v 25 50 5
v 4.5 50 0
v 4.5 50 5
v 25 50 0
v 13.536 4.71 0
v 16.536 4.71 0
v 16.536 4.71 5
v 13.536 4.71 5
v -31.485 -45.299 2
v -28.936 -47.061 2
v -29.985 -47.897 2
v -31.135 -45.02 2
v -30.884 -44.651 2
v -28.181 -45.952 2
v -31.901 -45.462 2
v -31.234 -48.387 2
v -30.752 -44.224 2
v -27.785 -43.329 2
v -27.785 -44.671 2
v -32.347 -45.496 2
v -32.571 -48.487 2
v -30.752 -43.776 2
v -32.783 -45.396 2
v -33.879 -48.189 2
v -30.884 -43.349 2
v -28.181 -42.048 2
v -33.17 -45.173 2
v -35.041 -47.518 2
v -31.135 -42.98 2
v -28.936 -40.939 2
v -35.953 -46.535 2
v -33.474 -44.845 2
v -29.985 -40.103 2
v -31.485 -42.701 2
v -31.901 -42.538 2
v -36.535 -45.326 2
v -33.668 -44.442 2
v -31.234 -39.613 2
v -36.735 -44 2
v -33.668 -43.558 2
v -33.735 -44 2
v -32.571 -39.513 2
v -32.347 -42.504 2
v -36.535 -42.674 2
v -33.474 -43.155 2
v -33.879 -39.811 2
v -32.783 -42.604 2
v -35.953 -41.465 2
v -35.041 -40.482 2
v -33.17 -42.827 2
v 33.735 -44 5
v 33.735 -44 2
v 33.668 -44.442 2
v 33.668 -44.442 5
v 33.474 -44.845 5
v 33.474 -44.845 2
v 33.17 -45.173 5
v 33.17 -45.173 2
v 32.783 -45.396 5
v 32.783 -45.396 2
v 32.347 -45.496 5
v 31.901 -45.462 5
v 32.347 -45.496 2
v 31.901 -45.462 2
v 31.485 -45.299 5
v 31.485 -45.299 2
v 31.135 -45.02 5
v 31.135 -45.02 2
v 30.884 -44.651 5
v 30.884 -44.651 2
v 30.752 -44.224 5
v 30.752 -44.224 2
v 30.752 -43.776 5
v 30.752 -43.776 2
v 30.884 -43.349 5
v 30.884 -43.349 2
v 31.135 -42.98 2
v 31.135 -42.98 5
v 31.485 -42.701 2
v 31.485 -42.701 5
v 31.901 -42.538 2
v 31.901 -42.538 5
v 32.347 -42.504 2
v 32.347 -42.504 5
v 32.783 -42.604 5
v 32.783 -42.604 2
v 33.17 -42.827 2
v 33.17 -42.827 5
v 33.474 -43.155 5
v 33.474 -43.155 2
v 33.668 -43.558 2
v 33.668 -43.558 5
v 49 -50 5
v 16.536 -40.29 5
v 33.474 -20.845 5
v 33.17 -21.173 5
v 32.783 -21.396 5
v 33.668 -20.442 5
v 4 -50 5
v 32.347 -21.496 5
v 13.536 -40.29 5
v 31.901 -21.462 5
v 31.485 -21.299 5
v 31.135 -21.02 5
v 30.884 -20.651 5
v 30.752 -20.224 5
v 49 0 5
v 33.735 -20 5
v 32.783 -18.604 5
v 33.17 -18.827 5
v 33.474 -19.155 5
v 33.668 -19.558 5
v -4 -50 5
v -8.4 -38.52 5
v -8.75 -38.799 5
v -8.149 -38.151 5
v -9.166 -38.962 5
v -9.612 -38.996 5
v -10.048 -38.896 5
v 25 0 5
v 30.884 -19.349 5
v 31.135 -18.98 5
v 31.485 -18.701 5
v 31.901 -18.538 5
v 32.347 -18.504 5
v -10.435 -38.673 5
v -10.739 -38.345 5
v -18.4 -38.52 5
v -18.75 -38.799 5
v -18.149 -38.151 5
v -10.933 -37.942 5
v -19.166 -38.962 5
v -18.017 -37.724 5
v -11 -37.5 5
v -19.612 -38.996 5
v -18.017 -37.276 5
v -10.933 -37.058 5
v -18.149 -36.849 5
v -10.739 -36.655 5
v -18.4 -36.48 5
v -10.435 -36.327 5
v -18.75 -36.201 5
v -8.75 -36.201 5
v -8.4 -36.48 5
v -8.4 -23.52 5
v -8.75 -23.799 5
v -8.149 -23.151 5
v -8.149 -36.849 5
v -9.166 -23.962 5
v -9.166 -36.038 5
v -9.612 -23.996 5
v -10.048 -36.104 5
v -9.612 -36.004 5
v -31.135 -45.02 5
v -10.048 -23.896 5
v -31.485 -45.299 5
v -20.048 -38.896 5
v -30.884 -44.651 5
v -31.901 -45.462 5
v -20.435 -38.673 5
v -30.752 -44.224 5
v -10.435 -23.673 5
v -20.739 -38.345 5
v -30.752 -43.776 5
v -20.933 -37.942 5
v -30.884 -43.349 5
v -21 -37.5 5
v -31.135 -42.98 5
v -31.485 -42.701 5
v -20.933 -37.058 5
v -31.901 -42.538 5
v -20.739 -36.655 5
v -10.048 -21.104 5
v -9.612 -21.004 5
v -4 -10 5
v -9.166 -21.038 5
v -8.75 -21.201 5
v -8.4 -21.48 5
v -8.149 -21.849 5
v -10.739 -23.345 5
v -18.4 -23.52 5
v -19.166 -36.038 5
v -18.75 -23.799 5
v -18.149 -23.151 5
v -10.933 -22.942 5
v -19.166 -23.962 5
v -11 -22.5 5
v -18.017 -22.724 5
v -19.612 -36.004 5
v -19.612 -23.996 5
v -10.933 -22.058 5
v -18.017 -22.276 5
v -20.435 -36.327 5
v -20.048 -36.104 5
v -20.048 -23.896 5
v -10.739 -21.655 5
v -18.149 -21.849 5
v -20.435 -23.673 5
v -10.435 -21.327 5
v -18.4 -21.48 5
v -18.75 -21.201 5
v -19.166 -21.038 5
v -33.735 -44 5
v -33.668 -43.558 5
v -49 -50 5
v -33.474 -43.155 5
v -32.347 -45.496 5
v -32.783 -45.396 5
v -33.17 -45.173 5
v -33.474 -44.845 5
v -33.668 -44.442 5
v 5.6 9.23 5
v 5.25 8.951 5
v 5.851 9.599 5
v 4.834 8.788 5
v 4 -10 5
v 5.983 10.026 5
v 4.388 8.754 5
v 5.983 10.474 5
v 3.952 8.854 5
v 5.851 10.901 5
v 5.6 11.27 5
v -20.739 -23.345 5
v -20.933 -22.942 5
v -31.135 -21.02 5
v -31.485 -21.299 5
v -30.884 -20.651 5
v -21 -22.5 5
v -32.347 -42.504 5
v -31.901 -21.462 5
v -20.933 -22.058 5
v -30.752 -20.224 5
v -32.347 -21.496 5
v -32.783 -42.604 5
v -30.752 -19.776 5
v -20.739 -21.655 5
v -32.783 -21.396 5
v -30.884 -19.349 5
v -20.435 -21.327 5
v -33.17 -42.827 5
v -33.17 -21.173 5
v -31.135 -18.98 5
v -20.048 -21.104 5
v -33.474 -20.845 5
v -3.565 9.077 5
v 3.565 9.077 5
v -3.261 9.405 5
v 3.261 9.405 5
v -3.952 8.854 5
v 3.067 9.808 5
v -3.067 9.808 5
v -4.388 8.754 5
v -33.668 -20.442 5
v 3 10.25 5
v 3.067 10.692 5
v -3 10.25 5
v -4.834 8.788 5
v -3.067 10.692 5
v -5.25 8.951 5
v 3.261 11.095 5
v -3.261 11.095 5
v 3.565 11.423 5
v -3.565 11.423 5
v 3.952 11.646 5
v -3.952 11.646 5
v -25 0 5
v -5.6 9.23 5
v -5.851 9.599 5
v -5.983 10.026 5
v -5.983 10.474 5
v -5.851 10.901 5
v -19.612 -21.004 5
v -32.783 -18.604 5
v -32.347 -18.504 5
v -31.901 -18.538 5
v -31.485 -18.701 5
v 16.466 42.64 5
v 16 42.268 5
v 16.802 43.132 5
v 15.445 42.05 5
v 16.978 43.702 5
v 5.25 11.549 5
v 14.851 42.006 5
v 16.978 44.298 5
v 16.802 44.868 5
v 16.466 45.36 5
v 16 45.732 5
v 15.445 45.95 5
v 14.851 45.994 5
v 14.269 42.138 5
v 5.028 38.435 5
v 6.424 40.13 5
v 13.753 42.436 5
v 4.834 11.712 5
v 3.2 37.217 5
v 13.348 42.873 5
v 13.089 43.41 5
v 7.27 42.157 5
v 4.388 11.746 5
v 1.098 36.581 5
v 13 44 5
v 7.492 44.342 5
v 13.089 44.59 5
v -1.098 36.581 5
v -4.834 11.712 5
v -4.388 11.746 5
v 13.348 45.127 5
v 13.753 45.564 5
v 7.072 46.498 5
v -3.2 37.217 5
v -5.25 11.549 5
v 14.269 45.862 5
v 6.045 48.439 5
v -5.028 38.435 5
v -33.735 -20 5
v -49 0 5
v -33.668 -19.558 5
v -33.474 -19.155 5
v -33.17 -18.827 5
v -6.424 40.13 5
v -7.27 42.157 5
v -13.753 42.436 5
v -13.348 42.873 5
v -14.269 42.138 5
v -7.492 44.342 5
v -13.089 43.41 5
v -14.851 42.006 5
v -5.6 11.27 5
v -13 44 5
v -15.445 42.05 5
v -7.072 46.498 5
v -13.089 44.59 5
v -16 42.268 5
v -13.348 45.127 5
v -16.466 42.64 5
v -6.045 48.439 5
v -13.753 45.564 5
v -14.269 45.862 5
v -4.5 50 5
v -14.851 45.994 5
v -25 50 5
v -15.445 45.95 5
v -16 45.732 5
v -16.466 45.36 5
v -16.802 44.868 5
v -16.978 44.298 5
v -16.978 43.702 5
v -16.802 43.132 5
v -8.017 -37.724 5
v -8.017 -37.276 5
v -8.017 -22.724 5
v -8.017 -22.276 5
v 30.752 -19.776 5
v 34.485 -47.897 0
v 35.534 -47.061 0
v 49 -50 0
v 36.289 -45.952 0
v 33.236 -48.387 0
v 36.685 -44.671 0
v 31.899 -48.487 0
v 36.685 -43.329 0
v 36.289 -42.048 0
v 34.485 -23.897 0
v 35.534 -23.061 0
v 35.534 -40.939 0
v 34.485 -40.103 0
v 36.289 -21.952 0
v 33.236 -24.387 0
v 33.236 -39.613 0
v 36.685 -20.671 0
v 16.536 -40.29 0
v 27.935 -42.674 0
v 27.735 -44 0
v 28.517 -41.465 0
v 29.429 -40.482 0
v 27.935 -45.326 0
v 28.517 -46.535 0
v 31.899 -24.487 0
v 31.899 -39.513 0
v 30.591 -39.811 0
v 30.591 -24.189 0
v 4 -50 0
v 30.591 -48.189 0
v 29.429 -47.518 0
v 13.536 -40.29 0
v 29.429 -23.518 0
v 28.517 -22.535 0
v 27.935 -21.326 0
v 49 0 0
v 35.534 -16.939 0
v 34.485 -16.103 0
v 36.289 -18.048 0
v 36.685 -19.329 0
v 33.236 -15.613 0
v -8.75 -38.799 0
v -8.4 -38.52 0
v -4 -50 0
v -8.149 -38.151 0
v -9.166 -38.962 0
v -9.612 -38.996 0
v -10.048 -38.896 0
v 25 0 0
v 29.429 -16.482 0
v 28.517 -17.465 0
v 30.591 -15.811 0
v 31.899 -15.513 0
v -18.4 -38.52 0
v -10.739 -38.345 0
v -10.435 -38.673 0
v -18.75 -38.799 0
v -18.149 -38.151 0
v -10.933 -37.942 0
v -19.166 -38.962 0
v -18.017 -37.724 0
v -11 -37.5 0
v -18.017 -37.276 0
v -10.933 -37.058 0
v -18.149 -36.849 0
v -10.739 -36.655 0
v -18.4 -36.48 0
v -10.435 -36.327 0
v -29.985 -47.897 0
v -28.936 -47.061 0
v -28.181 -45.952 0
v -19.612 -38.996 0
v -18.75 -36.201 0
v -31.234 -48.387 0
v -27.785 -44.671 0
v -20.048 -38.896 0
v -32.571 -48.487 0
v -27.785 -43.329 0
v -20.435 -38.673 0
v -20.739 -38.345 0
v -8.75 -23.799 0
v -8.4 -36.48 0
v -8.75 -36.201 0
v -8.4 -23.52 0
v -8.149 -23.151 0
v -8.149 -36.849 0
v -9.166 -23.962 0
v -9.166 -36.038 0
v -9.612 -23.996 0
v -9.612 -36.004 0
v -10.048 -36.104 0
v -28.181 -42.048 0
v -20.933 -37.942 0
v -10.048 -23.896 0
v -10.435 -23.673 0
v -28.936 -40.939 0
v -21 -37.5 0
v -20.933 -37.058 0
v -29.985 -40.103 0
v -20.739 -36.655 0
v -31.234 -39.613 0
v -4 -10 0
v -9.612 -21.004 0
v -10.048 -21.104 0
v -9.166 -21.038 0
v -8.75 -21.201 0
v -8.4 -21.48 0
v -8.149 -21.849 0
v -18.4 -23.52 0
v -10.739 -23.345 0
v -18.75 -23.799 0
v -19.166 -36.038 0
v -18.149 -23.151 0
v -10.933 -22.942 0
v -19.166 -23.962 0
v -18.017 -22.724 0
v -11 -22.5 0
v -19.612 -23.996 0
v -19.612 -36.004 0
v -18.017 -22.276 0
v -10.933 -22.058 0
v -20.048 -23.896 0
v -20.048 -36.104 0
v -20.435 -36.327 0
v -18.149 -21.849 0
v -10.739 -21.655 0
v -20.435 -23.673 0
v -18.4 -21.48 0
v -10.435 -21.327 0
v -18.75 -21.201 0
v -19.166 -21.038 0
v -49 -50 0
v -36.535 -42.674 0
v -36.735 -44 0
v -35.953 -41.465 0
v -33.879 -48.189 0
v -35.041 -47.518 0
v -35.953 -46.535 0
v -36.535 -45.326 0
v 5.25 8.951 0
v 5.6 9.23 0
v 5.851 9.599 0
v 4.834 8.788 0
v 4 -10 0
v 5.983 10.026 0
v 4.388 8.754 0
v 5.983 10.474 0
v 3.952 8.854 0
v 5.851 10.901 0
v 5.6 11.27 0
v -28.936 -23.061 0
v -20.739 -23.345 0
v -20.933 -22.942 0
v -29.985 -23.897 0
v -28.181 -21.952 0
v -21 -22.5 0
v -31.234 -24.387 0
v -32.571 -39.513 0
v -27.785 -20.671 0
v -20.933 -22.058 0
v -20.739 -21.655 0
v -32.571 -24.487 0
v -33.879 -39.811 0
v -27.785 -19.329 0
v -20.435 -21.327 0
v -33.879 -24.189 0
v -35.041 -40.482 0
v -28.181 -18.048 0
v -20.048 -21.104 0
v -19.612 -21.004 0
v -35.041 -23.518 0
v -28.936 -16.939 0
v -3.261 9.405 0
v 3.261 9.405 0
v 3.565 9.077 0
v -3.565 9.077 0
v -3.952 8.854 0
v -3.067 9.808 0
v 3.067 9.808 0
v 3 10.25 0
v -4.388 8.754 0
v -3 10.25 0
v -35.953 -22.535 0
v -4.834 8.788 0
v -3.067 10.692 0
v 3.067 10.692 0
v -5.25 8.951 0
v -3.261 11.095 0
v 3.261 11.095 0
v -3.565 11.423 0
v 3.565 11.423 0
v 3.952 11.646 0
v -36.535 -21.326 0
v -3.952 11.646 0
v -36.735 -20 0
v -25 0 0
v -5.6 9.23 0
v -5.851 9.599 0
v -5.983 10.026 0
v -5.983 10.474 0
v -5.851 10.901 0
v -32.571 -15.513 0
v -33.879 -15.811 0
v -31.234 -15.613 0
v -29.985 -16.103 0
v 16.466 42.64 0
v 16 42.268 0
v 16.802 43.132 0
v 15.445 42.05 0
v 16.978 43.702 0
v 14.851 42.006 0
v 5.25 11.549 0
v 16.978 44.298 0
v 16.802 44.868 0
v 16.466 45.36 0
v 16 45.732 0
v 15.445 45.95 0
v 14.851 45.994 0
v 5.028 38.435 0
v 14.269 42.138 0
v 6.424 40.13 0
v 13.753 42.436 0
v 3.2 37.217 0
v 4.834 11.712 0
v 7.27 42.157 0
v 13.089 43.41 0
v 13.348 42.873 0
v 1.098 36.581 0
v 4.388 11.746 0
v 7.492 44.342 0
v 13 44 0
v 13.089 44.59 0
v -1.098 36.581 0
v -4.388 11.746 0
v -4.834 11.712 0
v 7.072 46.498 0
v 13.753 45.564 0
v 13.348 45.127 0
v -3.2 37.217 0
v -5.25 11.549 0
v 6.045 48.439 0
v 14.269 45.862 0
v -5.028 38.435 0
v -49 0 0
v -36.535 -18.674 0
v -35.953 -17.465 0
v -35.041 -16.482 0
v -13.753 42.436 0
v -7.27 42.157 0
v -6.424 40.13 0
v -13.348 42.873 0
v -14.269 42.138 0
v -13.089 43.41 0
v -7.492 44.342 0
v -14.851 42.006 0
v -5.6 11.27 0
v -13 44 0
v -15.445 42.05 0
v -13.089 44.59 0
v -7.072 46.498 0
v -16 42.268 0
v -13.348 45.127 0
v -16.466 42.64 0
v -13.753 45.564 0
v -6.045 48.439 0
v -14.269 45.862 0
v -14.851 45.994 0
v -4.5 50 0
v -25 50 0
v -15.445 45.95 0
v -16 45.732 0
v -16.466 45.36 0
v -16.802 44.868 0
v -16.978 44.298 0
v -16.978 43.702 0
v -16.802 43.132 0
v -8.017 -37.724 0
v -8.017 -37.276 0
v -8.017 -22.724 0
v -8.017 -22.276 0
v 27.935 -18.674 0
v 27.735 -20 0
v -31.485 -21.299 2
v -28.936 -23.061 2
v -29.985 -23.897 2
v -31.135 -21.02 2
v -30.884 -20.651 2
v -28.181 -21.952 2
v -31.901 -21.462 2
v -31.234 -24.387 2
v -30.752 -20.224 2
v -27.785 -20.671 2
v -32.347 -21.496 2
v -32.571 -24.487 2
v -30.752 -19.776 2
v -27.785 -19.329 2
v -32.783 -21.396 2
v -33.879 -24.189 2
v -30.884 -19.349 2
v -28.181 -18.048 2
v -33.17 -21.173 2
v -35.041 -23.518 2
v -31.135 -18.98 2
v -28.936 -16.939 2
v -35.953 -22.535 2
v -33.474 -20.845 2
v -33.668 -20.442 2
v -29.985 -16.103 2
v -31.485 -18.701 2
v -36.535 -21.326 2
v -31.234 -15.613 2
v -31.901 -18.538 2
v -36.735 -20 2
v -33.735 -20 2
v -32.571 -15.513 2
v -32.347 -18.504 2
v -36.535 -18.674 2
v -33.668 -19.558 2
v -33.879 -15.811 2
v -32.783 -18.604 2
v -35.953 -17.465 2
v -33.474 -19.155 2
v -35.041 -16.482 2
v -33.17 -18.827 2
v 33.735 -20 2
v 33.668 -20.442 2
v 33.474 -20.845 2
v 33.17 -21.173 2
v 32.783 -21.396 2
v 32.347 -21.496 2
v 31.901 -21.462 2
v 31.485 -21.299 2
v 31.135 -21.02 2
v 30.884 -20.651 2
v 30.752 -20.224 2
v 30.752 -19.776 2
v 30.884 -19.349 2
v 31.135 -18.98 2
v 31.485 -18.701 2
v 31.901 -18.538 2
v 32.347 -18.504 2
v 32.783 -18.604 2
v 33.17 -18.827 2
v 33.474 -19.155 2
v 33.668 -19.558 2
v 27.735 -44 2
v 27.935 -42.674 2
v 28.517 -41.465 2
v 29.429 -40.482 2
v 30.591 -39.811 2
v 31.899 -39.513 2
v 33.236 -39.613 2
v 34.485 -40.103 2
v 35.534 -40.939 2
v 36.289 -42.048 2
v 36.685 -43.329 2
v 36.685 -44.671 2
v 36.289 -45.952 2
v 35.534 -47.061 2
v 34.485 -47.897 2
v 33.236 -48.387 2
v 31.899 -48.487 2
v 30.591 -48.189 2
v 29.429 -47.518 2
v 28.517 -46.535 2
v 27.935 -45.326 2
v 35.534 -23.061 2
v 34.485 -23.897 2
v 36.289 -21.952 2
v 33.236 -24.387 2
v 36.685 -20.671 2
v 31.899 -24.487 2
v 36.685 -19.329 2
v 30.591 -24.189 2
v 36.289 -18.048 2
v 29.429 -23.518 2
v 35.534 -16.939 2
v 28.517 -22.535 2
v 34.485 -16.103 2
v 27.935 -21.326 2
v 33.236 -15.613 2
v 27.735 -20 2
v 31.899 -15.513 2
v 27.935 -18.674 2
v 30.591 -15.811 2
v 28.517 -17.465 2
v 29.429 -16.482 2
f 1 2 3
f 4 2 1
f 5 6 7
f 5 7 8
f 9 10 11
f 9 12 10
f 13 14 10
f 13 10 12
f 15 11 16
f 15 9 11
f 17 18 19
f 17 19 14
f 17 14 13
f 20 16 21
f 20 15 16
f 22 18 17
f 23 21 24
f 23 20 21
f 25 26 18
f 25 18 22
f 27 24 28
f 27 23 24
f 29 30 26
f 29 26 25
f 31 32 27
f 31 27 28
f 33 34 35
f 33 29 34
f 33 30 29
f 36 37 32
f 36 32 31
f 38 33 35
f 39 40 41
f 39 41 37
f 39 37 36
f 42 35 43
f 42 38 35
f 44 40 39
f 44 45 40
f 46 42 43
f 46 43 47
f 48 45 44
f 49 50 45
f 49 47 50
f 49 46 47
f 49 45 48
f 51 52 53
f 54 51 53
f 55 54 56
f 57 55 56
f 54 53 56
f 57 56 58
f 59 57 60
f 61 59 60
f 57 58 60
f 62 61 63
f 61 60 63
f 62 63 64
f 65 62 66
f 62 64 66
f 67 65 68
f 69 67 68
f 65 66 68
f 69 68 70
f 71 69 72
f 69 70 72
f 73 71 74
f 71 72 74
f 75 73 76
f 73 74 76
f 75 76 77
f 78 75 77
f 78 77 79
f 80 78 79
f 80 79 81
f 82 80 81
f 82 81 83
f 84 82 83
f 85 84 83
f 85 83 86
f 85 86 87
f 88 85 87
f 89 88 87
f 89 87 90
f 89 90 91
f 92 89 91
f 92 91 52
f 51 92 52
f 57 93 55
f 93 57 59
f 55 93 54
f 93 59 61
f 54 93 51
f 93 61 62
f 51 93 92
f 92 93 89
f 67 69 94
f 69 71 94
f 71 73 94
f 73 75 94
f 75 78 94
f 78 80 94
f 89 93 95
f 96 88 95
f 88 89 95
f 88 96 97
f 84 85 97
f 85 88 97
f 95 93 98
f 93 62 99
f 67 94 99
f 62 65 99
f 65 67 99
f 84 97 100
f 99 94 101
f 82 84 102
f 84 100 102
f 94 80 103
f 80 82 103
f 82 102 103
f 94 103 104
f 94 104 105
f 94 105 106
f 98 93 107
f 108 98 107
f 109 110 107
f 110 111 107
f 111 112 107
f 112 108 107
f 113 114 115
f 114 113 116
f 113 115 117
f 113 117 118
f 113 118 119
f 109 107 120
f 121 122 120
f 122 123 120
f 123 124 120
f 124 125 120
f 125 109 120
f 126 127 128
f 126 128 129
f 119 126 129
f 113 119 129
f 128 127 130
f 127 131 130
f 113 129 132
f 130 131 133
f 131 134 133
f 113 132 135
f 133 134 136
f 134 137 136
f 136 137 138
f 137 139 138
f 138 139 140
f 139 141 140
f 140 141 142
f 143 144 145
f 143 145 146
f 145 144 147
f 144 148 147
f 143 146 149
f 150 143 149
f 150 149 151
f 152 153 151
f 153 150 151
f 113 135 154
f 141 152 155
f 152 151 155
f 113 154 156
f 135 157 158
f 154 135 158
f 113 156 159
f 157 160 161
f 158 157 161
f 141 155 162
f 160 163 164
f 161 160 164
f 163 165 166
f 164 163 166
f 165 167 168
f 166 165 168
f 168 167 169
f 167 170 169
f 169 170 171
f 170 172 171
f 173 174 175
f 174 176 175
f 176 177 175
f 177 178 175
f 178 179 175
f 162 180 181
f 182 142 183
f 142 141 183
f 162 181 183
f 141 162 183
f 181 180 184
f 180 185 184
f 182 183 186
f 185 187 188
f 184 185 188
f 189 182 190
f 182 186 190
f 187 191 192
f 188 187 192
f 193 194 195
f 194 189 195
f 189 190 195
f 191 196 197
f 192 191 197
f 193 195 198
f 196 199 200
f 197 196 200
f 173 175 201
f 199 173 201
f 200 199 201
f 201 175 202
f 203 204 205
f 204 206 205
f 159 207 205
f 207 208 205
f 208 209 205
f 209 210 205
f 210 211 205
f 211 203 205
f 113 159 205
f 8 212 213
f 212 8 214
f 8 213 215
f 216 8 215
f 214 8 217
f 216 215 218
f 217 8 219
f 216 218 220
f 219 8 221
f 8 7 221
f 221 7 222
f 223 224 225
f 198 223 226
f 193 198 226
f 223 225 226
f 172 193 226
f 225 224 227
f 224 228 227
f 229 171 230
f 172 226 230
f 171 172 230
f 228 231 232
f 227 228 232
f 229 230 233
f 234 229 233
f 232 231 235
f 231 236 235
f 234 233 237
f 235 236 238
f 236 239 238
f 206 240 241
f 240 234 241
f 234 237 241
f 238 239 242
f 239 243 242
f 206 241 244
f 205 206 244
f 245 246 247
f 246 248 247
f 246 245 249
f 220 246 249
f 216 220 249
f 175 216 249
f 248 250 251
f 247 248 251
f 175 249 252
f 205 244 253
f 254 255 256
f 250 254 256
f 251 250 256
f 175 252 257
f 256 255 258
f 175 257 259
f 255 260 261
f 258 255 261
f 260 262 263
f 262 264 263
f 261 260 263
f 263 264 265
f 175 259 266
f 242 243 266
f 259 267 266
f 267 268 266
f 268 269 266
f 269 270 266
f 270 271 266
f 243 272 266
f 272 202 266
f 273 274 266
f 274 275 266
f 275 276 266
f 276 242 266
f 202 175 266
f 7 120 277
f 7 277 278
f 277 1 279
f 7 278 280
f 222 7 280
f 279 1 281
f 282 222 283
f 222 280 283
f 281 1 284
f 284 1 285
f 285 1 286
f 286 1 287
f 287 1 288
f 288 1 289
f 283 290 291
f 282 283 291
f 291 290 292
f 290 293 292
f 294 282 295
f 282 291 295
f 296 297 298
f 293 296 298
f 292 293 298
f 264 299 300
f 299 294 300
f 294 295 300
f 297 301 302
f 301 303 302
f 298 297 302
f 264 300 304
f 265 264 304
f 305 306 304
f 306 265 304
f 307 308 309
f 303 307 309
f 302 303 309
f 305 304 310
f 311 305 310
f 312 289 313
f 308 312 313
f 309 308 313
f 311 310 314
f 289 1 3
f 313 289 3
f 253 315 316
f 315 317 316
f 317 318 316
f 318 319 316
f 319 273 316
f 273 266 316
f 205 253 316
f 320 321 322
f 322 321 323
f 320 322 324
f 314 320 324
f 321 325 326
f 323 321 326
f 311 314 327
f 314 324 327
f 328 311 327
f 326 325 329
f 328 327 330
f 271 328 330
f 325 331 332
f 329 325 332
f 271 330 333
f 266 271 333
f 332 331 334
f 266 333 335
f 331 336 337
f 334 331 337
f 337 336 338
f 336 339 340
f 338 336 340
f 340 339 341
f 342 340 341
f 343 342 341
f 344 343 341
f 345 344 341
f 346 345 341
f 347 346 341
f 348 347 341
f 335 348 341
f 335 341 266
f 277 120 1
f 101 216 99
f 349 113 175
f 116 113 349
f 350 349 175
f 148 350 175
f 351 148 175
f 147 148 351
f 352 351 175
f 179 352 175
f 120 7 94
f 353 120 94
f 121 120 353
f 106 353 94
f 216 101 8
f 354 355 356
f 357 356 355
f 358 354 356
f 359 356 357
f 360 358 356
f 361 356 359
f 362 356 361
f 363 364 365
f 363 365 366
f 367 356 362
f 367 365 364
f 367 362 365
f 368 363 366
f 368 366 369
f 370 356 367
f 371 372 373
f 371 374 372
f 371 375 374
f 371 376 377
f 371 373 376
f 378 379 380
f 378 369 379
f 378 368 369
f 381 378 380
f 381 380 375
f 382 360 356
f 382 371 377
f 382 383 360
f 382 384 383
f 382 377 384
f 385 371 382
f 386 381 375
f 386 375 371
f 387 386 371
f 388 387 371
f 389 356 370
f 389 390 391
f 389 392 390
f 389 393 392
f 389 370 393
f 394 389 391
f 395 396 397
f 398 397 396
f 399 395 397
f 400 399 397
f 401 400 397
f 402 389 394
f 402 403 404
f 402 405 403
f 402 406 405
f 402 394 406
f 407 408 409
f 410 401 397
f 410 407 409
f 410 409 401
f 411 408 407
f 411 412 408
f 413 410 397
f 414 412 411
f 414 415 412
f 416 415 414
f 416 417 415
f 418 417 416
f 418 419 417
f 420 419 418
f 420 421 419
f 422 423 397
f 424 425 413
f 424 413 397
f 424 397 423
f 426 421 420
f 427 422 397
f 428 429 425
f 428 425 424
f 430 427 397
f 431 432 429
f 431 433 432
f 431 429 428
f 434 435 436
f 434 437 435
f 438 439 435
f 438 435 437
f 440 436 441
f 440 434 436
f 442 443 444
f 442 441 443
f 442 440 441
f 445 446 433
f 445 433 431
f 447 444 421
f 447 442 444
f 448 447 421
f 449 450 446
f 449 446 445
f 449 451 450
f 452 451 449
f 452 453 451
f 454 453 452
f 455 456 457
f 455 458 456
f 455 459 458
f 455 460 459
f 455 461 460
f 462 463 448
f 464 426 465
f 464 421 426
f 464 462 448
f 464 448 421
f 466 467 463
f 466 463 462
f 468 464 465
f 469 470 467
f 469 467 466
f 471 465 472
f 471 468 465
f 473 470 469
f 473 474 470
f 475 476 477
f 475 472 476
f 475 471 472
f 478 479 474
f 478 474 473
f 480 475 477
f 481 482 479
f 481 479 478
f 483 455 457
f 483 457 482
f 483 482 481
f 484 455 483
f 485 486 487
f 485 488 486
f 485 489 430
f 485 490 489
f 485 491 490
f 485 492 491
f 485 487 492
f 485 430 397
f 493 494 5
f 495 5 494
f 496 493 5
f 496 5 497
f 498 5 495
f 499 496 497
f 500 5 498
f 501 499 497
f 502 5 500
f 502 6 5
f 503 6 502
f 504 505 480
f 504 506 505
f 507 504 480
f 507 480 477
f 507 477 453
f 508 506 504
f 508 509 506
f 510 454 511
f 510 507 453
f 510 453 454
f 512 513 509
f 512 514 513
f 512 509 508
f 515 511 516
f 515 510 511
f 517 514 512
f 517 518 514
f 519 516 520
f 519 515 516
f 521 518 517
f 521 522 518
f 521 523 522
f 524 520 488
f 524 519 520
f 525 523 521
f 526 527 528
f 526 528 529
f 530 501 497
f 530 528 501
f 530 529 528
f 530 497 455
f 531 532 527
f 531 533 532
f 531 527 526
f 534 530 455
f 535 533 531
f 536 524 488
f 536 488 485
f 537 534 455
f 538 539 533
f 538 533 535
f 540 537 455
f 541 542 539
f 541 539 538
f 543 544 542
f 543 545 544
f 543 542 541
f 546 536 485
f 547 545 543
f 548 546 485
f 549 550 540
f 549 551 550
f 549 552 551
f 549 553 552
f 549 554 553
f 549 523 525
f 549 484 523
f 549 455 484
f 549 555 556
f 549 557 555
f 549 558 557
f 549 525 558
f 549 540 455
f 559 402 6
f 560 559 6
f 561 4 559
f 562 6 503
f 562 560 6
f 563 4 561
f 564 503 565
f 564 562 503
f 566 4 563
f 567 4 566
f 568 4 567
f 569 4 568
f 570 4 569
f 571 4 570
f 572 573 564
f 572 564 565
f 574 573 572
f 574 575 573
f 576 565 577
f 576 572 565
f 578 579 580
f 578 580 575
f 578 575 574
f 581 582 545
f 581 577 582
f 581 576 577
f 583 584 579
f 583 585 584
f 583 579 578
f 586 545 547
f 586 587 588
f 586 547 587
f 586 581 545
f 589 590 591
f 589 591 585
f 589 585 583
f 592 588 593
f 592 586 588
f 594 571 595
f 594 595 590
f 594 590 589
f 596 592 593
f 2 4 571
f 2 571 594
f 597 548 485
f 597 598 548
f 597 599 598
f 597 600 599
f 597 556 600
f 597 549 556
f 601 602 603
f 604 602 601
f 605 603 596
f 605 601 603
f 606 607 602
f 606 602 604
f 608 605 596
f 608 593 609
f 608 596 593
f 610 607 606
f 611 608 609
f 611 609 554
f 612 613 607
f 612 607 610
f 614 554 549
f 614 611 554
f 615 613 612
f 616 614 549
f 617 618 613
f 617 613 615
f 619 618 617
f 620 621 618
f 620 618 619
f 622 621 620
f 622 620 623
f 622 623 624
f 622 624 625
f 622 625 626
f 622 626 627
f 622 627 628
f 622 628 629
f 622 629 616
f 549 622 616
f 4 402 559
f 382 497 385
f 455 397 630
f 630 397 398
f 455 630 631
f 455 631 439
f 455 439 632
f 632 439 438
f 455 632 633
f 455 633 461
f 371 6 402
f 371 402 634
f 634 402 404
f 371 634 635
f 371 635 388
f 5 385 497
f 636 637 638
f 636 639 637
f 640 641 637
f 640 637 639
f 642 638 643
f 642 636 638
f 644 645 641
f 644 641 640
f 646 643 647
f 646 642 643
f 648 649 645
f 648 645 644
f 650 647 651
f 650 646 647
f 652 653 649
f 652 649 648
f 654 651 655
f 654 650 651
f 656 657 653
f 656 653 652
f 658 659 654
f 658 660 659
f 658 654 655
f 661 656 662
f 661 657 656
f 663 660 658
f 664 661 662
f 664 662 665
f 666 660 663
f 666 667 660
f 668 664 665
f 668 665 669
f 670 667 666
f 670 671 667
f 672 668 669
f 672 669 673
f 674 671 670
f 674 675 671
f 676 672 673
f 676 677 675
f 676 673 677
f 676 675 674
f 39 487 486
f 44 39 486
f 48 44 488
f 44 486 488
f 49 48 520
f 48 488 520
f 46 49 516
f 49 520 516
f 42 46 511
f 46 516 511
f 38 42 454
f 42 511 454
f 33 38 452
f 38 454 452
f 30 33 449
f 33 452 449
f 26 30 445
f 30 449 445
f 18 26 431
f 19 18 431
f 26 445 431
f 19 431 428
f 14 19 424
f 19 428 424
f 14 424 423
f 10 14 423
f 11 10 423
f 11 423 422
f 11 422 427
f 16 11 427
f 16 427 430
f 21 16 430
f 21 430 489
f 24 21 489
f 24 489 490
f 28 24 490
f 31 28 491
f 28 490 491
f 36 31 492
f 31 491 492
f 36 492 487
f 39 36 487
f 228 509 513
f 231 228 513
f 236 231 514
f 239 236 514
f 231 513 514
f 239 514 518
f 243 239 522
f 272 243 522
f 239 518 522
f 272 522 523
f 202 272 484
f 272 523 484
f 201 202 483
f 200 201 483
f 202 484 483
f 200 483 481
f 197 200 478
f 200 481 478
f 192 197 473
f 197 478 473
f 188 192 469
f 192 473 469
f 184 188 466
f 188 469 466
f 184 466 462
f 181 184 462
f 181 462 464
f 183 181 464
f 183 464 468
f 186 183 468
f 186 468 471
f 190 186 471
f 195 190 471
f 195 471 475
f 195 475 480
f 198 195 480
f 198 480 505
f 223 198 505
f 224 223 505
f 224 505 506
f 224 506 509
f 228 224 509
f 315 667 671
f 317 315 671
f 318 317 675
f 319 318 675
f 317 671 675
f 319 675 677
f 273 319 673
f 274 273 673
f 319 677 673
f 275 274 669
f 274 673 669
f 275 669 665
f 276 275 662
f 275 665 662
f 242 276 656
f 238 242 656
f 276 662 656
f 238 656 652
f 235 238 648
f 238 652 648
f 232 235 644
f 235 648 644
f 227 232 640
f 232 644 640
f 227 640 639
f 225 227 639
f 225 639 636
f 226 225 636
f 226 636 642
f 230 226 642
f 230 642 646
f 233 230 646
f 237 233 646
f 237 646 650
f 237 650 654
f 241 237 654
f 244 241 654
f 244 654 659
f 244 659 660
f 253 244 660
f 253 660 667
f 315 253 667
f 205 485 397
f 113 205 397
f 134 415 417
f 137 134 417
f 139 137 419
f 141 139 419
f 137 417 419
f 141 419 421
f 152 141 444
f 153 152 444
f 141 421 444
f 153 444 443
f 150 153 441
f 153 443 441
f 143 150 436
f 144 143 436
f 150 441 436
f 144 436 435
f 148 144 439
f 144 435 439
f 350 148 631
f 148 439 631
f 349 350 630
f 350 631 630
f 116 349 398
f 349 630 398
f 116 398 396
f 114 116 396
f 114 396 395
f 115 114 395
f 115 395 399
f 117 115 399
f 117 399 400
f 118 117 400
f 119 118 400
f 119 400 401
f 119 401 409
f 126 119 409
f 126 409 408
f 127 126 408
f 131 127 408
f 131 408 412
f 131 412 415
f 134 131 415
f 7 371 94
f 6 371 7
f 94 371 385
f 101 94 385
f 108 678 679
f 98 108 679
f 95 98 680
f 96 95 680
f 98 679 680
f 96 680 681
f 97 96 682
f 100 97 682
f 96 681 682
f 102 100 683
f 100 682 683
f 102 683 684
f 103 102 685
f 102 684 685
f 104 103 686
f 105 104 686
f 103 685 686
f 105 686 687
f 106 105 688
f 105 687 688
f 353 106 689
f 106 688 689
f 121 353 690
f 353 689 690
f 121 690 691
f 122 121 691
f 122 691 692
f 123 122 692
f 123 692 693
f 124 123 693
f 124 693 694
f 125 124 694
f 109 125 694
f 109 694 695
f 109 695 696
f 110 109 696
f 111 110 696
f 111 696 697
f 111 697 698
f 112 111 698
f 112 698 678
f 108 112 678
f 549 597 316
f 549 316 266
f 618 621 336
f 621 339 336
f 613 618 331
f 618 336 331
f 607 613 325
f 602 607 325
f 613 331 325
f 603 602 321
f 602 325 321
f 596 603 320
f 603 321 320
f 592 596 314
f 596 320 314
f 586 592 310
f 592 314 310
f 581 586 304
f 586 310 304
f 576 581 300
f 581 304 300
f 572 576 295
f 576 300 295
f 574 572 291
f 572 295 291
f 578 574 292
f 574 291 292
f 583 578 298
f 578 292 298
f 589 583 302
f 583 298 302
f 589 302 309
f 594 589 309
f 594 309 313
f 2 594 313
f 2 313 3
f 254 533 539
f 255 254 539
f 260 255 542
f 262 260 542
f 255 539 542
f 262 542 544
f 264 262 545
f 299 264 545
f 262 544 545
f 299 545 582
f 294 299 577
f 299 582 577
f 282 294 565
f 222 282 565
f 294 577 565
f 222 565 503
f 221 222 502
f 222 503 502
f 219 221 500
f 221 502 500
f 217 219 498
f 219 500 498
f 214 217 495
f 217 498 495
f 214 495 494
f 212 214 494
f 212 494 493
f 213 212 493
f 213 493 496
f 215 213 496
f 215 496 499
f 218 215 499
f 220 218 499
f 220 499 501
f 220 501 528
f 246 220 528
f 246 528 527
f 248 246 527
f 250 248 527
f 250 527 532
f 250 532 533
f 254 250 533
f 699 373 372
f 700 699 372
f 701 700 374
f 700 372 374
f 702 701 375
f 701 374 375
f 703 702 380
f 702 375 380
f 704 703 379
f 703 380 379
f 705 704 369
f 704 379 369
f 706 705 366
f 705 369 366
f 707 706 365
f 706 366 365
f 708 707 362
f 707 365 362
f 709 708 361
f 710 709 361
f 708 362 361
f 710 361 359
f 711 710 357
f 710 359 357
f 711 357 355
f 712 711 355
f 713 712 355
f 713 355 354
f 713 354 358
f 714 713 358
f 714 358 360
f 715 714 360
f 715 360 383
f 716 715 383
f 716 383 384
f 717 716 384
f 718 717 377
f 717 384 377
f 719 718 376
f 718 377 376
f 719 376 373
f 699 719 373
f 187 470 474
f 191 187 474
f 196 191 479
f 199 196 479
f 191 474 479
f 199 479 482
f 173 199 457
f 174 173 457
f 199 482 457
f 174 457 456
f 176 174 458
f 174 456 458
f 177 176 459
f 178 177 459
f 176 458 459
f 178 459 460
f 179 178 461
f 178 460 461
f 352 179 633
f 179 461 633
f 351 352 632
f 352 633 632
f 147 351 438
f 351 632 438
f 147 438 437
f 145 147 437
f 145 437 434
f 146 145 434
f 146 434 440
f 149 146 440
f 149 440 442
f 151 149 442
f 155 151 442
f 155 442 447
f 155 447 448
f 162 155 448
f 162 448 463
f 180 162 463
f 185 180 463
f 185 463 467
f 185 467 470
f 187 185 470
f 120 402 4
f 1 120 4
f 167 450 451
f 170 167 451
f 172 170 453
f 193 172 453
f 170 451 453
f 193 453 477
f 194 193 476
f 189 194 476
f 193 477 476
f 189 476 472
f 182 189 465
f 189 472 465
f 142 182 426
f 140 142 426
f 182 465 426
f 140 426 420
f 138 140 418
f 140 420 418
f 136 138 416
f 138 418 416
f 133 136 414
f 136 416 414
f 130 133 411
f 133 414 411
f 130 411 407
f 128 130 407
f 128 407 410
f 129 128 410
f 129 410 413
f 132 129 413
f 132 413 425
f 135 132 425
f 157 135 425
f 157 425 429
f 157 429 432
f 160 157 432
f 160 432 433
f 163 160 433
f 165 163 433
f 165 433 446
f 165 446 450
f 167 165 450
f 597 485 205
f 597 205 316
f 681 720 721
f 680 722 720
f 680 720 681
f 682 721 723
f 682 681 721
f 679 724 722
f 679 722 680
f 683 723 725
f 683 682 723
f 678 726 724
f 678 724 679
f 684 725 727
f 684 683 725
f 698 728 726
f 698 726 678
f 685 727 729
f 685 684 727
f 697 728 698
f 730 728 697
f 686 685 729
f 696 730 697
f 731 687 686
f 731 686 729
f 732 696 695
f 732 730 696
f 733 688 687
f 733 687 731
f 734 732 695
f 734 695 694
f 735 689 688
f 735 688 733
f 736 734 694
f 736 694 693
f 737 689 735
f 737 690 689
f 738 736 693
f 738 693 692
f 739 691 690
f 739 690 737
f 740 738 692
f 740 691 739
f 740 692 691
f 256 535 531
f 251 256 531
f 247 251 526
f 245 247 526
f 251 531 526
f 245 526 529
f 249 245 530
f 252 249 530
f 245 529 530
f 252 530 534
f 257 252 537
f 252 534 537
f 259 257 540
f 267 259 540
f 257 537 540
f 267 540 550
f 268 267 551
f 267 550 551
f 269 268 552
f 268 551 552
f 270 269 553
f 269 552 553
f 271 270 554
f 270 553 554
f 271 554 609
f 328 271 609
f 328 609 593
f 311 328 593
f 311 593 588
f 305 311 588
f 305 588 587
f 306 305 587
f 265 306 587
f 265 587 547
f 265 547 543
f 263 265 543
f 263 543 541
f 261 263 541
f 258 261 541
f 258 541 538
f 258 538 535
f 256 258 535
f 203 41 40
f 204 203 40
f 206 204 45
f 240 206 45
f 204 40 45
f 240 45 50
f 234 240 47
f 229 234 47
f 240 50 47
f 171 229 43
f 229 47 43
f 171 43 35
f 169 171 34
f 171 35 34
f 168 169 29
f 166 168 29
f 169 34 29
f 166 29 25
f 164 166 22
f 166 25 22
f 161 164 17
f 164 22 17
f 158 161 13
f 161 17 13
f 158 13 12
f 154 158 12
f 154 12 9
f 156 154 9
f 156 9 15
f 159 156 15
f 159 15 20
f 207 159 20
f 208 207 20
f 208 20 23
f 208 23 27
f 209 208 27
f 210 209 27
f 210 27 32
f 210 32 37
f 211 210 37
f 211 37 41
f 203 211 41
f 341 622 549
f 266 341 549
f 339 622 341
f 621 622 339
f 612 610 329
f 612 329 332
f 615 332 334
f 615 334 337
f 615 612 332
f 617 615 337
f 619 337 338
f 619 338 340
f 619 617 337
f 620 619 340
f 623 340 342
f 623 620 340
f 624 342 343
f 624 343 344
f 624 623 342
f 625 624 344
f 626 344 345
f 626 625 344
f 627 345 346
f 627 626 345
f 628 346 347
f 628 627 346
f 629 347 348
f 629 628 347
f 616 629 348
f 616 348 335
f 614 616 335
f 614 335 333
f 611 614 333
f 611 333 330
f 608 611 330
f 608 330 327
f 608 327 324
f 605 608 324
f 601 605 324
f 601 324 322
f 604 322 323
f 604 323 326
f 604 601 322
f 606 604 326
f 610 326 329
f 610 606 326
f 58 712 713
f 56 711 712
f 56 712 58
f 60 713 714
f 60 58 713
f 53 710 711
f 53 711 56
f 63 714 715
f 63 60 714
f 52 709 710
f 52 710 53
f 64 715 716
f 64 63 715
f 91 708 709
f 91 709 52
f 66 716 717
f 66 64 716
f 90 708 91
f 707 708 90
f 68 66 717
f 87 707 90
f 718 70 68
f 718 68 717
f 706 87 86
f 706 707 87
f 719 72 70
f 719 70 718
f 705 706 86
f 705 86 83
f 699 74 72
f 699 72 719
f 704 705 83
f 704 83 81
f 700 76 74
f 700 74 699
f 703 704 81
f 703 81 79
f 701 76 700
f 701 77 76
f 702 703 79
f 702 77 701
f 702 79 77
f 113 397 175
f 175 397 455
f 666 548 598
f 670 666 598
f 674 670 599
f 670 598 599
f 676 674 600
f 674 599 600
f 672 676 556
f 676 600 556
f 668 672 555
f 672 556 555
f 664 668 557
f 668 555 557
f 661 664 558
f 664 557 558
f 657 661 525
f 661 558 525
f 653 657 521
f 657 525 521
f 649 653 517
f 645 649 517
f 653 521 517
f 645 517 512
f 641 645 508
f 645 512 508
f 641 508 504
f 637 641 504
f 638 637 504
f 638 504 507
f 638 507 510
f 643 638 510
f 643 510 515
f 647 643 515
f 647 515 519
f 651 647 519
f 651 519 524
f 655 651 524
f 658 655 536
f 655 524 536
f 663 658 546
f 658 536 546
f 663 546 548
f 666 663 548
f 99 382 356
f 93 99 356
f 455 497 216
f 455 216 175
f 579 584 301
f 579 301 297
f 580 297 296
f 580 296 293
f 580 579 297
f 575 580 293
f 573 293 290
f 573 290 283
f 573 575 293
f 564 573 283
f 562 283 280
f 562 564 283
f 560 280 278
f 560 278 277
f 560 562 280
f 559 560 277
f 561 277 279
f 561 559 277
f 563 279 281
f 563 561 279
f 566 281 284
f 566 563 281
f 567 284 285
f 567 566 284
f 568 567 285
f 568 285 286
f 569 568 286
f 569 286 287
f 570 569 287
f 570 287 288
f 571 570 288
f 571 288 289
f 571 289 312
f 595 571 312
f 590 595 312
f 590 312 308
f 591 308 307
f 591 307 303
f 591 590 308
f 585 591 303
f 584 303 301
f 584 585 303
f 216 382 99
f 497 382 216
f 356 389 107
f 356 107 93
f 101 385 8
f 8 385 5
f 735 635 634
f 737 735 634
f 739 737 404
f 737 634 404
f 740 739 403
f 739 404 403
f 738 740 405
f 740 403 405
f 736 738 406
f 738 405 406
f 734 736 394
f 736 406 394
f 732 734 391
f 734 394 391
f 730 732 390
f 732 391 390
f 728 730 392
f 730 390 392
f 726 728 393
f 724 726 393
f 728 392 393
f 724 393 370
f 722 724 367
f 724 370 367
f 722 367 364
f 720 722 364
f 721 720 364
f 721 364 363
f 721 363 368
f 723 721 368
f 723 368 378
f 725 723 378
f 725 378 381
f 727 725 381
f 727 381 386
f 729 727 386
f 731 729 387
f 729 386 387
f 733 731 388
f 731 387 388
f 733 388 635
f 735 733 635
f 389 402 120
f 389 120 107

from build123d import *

# Parameters (mm, degrees)
SKETCH_1_R          = 2
EXTRUDE_1_DEPTH     = 5
SKETCH_2_R          = 7.5
CUT_EXTRUDE_1_DEPTH = 10
SKETCH_3_W          = 8
SKETCH_3_H          = 40
CUT_EXTRUDE_2_DEPTH = 71.185468581
SKETCH_6_R          = 1.5
CUT_EXTRUDE_3_DEPTH = 71.185468581
SKETCH_7_R          = 4.5
SKETCH_7_R_2        = 1.5
CUT_EXTRUDE_4_DEPTH = 2
SKETCH_8_W          = 3
SKETCH_8_H          = 45
CUT_EXTRUDE_5_DEPTH = 71.185468581
SKETCH_9_R          = 1.5
CUT_EXTRUDE_6_DEPTH = 10
SKETCH_10_R         = 1.5
CUT_EXTRUDE_7_DEPTH = 10


with BuildPart() as part:
    # 草图1 → 凸台-拉伸1 (new body)
    with BuildSketch(Plane.XY):
        Polygon((-25, 50), (25, 50), (25, 32.424322584), (25, 0), (49, 0), (49, -50), (25, -50), (-25, -50), (-49, -50), (-49, 0), (-25, 0), (-25, 32.424322584), align=None)
        with Locations((-15, 44)):
            Circle(SKETCH_1_R, mode=Mode.SUBTRACT)
        with Locations(Location((15, 44, 0), (0, 0, 180))):
            Circle(SKETCH_1_R, mode=Mode.SUBTRACT)
    extrude(amount=EXTRUDE_1_DEPTH)

    # 草图2 → 切除-拉伸1 (cut)
    with BuildSketch(Plane.XY.offset(5)):
        with Locations((0, 44)):
            Circle(SKETCH_2_R)
    extrude(amount=-CUT_EXTRUDE_1_DEPTH, mode=Mode.SUBTRACT)

    # 草图3 → 切除-拉伸2 (cut, through all)
    with BuildSketch(Plane(origin=(0, 0, 0), x_dir=(-1, 0, 0), z_dir=(0, 0, -1))):
        with Locations((0, -30)):
            Rectangle(SKETCH_3_W, SKETCH_3_H)
    extrude(amount=-CUT_EXTRUDE_2_DEPTH, mode=Mode.SUBTRACT)

    # 草图6 → 切除-拉伸3 (cut, through all)
    with BuildSketch(Plane(origin=(0, 0, 0), x_dir=(-1, 0, 0), z_dir=(0, 0, -1))):
        with Locations(Location((-32.235018023, -44, 0), (0, 0, 180))):
            Circle(SKETCH_6_R)
        with Locations(Location((-32.235018023, -20, 0), (0, 0, 180))):
            Circle(SKETCH_6_R)
        with Locations((32.235018023, -44)):
            Circle(SKETCH_6_R)
        with Locations((32.235018023, -20)):
            Circle(SKETCH_6_R)
    extrude(amount=-CUT_EXTRUDE_3_DEPTH, mode=Mode.SUBTRACT)

    # 草图7 → 切除-拉伸4 (cut)
    # profile 1 of 4: a face of its own
    with BuildSketch(Plane(origin=(0, 0, 0), x_dir=(-1, 0, 0), z_dir=(0, 0, -1))):
        with Locations((-32.235018023, -44)):
            Circle(SKETCH_7_R)
        with Locations((-32.235018023, -44)):
            Circle(SKETCH_7_R_2, mode=Mode.SUBTRACT)
    # profile 2 of 4: a face of its own
    with BuildSketch(Plane(origin=(0, 0, 0), x_dir=(-1, 0, 0), z_dir=(0, 0, -1))):
        with Locations((-32.235018023, -20)):
            Circle(SKETCH_7_R)
        with Locations((-32.235018023, -20)):
            Circle(SKETCH_7_R_2, mode=Mode.SUBTRACT)
    # profile 3 of 4: a face of its own
    with BuildSketch(Plane(origin=(0, 0, 0), x_dir=(-1, 0, 0), z_dir=(0, 0, -1))):
        with Locations((32.235018023, -20)):
            Circle(SKETCH_7_R)
        with Locations((32.235018023, -20)):
            Circle(SKETCH_7_R_2, mode=Mode.SUBTRACT)
    # profile 4 of 4: a face of its own
    with BuildSketch(Plane(origin=(0, 0, 0), x_dir=(-1, 0, 0), z_dir=(0, 0, -1))):
        with Locations((32.235018023, -44)):
            Circle(SKETCH_7_R)
        with Locations((32.235018023, -44)):
            Circle(SKETCH_7_R_2, mode=Mode.SUBTRACT)
    extrude(amount=-CUT_EXTRUDE_4_DEPTH, mode=Mode.SUBTRACT)

    # 草图8 → 切除-拉伸5 (cut, through all)
    with BuildSketch(Plane(origin=(0, 0, 0), x_dir=(-1, 0, 0), z_dir=(0, 0, -1))):
        with Locations((-15.035926406, -17.789740129)):
            Rectangle(SKETCH_8_W, SKETCH_8_H)
    extrude(amount=-CUT_EXTRUDE_5_DEPTH, mode=Mode.SUBTRACT)

    # 草图9 → 切除-拉伸6 (cut)
    with BuildSketch(Plane(origin=(0, 0, 0), x_dir=(-1, 0, 0), z_dir=(0, 0, -1))):
        with Locations((-4.5, 10.25)):
            Circle(SKETCH_9_R)
        with Locations(Location((4.5, 10.25, 0), (0, 0, 180))):
            Circle(SKETCH_9_R)
    extrude(amount=-CUT_EXTRUDE_6_DEPTH, mode=Mode.SUBTRACT)

    # 草图10 → 切除-拉伸7 (cut)
    with BuildSketch(Plane(origin=(0, 0, 0), x_dir=(-1, 0, 0), z_dir=(0, 0, -1))):
        with Locations((9.5, -22.5)):
            Circle(SKETCH_10_R)
        with Locations((19.5, -22.5)):
            Circle(SKETCH_10_R)
        with Locations((19.5, -37.5)):
            Circle(SKETCH_10_R)
        with Locations((9.5, -37.5)):
            Circle(SKETCH_10_R)
    extrude(amount=-CUT_EXTRUDE_7_DEPTH, mode=Mode.SUBTRACT)


solid = part.part
